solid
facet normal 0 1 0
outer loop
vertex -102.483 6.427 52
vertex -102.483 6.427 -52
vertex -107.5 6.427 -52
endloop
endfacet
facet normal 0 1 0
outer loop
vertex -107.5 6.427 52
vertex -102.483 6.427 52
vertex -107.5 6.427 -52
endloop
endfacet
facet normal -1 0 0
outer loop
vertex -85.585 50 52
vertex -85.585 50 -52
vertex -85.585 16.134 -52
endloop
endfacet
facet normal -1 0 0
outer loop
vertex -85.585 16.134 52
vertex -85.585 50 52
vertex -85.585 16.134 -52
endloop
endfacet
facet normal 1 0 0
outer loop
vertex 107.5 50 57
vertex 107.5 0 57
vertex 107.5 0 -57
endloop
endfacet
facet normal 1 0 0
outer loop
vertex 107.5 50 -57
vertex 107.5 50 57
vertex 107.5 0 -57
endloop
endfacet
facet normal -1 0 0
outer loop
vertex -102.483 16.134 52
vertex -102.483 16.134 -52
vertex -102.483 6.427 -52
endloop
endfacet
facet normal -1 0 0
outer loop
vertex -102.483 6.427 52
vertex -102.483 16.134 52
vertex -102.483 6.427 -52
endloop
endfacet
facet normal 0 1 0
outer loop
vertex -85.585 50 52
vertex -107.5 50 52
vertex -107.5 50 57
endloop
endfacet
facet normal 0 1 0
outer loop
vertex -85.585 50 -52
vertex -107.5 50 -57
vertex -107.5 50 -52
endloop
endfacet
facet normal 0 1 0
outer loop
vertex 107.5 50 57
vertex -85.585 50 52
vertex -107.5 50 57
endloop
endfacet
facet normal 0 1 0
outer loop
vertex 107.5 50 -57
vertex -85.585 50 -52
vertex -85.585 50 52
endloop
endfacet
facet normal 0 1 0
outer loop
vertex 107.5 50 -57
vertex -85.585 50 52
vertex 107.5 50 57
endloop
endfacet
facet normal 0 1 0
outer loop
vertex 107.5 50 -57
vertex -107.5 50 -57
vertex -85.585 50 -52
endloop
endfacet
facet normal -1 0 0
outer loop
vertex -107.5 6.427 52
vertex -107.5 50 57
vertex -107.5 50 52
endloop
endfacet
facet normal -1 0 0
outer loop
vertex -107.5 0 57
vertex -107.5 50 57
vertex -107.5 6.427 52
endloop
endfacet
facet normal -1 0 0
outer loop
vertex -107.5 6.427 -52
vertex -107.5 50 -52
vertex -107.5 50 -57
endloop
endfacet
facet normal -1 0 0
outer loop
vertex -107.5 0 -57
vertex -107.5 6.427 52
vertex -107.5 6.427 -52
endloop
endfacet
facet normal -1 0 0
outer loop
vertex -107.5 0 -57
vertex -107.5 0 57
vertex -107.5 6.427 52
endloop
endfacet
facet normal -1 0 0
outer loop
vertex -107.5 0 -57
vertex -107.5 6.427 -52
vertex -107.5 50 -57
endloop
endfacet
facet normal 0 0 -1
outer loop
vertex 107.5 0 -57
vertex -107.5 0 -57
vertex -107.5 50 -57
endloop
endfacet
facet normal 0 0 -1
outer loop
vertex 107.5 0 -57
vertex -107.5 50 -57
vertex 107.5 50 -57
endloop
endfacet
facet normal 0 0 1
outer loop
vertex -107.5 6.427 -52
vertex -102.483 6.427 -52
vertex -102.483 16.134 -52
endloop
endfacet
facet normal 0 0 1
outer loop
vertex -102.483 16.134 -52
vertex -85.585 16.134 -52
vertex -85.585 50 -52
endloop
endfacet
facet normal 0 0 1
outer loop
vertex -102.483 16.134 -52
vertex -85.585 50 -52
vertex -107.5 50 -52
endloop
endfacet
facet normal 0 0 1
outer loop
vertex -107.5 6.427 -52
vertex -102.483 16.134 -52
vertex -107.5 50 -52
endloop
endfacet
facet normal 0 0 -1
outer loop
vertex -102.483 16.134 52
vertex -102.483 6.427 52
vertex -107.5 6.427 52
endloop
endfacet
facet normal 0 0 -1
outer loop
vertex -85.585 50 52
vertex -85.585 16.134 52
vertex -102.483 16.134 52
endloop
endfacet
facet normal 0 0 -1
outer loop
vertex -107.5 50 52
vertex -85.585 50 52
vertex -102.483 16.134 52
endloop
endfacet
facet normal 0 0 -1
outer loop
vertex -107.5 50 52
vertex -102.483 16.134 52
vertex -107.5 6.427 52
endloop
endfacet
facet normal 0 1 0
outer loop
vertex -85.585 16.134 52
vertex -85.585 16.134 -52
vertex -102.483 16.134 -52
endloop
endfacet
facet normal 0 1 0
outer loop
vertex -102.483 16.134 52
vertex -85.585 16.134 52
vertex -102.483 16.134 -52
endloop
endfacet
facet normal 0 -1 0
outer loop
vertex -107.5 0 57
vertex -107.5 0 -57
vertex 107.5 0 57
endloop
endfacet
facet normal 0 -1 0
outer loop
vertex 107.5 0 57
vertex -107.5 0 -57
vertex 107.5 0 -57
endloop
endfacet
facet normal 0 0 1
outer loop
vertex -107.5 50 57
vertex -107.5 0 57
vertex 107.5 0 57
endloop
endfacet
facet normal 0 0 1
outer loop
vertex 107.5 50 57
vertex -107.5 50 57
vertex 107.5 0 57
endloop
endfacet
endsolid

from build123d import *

# Parameters (mm, degrees)
ESBO_O1_W                = 215
ESBO_O1_H                = 114
RESSALTO_EXTRUS_O1_DEPTH = 50
CORTE_EXTRUS_O1_START    = -109
CORTE_EXTRUS_O1_DEPTH    = 104


with BuildPart() as part:
    # Esboço1 → Ressalto-extrusão1 (new body)
    with BuildSketch(Plane(origin=(0, 0, 0), x_dir=(1, 0, 0), z_dir=(0, 1, 0))):
        Rectangle(ESBO_O1_W, ESBO_O1_H)
    extrude(amount=RESSALTO_EXTRUS_O1_DEPTH)

    # Esboço3 → Corte-extrusão1 (cut)
    with BuildSketch(Plane.XY.offset(57).offset(CORTE_EXTRUS_O1_START)):
        Polygon((-107.5, 50), (-85.58523496, 50), (-85.58523496, 16.13389081), (-102.483117777, 16.13389081), (-102.483117777, 6.426889092), (-107.5, 6.426889092), (-107.5, 17.457061978), align=None)
    extrude(amount=CORTE_EXTRUS_O1_DEPTH, mode=Mode.SUBTRACT)


solid = part.part
